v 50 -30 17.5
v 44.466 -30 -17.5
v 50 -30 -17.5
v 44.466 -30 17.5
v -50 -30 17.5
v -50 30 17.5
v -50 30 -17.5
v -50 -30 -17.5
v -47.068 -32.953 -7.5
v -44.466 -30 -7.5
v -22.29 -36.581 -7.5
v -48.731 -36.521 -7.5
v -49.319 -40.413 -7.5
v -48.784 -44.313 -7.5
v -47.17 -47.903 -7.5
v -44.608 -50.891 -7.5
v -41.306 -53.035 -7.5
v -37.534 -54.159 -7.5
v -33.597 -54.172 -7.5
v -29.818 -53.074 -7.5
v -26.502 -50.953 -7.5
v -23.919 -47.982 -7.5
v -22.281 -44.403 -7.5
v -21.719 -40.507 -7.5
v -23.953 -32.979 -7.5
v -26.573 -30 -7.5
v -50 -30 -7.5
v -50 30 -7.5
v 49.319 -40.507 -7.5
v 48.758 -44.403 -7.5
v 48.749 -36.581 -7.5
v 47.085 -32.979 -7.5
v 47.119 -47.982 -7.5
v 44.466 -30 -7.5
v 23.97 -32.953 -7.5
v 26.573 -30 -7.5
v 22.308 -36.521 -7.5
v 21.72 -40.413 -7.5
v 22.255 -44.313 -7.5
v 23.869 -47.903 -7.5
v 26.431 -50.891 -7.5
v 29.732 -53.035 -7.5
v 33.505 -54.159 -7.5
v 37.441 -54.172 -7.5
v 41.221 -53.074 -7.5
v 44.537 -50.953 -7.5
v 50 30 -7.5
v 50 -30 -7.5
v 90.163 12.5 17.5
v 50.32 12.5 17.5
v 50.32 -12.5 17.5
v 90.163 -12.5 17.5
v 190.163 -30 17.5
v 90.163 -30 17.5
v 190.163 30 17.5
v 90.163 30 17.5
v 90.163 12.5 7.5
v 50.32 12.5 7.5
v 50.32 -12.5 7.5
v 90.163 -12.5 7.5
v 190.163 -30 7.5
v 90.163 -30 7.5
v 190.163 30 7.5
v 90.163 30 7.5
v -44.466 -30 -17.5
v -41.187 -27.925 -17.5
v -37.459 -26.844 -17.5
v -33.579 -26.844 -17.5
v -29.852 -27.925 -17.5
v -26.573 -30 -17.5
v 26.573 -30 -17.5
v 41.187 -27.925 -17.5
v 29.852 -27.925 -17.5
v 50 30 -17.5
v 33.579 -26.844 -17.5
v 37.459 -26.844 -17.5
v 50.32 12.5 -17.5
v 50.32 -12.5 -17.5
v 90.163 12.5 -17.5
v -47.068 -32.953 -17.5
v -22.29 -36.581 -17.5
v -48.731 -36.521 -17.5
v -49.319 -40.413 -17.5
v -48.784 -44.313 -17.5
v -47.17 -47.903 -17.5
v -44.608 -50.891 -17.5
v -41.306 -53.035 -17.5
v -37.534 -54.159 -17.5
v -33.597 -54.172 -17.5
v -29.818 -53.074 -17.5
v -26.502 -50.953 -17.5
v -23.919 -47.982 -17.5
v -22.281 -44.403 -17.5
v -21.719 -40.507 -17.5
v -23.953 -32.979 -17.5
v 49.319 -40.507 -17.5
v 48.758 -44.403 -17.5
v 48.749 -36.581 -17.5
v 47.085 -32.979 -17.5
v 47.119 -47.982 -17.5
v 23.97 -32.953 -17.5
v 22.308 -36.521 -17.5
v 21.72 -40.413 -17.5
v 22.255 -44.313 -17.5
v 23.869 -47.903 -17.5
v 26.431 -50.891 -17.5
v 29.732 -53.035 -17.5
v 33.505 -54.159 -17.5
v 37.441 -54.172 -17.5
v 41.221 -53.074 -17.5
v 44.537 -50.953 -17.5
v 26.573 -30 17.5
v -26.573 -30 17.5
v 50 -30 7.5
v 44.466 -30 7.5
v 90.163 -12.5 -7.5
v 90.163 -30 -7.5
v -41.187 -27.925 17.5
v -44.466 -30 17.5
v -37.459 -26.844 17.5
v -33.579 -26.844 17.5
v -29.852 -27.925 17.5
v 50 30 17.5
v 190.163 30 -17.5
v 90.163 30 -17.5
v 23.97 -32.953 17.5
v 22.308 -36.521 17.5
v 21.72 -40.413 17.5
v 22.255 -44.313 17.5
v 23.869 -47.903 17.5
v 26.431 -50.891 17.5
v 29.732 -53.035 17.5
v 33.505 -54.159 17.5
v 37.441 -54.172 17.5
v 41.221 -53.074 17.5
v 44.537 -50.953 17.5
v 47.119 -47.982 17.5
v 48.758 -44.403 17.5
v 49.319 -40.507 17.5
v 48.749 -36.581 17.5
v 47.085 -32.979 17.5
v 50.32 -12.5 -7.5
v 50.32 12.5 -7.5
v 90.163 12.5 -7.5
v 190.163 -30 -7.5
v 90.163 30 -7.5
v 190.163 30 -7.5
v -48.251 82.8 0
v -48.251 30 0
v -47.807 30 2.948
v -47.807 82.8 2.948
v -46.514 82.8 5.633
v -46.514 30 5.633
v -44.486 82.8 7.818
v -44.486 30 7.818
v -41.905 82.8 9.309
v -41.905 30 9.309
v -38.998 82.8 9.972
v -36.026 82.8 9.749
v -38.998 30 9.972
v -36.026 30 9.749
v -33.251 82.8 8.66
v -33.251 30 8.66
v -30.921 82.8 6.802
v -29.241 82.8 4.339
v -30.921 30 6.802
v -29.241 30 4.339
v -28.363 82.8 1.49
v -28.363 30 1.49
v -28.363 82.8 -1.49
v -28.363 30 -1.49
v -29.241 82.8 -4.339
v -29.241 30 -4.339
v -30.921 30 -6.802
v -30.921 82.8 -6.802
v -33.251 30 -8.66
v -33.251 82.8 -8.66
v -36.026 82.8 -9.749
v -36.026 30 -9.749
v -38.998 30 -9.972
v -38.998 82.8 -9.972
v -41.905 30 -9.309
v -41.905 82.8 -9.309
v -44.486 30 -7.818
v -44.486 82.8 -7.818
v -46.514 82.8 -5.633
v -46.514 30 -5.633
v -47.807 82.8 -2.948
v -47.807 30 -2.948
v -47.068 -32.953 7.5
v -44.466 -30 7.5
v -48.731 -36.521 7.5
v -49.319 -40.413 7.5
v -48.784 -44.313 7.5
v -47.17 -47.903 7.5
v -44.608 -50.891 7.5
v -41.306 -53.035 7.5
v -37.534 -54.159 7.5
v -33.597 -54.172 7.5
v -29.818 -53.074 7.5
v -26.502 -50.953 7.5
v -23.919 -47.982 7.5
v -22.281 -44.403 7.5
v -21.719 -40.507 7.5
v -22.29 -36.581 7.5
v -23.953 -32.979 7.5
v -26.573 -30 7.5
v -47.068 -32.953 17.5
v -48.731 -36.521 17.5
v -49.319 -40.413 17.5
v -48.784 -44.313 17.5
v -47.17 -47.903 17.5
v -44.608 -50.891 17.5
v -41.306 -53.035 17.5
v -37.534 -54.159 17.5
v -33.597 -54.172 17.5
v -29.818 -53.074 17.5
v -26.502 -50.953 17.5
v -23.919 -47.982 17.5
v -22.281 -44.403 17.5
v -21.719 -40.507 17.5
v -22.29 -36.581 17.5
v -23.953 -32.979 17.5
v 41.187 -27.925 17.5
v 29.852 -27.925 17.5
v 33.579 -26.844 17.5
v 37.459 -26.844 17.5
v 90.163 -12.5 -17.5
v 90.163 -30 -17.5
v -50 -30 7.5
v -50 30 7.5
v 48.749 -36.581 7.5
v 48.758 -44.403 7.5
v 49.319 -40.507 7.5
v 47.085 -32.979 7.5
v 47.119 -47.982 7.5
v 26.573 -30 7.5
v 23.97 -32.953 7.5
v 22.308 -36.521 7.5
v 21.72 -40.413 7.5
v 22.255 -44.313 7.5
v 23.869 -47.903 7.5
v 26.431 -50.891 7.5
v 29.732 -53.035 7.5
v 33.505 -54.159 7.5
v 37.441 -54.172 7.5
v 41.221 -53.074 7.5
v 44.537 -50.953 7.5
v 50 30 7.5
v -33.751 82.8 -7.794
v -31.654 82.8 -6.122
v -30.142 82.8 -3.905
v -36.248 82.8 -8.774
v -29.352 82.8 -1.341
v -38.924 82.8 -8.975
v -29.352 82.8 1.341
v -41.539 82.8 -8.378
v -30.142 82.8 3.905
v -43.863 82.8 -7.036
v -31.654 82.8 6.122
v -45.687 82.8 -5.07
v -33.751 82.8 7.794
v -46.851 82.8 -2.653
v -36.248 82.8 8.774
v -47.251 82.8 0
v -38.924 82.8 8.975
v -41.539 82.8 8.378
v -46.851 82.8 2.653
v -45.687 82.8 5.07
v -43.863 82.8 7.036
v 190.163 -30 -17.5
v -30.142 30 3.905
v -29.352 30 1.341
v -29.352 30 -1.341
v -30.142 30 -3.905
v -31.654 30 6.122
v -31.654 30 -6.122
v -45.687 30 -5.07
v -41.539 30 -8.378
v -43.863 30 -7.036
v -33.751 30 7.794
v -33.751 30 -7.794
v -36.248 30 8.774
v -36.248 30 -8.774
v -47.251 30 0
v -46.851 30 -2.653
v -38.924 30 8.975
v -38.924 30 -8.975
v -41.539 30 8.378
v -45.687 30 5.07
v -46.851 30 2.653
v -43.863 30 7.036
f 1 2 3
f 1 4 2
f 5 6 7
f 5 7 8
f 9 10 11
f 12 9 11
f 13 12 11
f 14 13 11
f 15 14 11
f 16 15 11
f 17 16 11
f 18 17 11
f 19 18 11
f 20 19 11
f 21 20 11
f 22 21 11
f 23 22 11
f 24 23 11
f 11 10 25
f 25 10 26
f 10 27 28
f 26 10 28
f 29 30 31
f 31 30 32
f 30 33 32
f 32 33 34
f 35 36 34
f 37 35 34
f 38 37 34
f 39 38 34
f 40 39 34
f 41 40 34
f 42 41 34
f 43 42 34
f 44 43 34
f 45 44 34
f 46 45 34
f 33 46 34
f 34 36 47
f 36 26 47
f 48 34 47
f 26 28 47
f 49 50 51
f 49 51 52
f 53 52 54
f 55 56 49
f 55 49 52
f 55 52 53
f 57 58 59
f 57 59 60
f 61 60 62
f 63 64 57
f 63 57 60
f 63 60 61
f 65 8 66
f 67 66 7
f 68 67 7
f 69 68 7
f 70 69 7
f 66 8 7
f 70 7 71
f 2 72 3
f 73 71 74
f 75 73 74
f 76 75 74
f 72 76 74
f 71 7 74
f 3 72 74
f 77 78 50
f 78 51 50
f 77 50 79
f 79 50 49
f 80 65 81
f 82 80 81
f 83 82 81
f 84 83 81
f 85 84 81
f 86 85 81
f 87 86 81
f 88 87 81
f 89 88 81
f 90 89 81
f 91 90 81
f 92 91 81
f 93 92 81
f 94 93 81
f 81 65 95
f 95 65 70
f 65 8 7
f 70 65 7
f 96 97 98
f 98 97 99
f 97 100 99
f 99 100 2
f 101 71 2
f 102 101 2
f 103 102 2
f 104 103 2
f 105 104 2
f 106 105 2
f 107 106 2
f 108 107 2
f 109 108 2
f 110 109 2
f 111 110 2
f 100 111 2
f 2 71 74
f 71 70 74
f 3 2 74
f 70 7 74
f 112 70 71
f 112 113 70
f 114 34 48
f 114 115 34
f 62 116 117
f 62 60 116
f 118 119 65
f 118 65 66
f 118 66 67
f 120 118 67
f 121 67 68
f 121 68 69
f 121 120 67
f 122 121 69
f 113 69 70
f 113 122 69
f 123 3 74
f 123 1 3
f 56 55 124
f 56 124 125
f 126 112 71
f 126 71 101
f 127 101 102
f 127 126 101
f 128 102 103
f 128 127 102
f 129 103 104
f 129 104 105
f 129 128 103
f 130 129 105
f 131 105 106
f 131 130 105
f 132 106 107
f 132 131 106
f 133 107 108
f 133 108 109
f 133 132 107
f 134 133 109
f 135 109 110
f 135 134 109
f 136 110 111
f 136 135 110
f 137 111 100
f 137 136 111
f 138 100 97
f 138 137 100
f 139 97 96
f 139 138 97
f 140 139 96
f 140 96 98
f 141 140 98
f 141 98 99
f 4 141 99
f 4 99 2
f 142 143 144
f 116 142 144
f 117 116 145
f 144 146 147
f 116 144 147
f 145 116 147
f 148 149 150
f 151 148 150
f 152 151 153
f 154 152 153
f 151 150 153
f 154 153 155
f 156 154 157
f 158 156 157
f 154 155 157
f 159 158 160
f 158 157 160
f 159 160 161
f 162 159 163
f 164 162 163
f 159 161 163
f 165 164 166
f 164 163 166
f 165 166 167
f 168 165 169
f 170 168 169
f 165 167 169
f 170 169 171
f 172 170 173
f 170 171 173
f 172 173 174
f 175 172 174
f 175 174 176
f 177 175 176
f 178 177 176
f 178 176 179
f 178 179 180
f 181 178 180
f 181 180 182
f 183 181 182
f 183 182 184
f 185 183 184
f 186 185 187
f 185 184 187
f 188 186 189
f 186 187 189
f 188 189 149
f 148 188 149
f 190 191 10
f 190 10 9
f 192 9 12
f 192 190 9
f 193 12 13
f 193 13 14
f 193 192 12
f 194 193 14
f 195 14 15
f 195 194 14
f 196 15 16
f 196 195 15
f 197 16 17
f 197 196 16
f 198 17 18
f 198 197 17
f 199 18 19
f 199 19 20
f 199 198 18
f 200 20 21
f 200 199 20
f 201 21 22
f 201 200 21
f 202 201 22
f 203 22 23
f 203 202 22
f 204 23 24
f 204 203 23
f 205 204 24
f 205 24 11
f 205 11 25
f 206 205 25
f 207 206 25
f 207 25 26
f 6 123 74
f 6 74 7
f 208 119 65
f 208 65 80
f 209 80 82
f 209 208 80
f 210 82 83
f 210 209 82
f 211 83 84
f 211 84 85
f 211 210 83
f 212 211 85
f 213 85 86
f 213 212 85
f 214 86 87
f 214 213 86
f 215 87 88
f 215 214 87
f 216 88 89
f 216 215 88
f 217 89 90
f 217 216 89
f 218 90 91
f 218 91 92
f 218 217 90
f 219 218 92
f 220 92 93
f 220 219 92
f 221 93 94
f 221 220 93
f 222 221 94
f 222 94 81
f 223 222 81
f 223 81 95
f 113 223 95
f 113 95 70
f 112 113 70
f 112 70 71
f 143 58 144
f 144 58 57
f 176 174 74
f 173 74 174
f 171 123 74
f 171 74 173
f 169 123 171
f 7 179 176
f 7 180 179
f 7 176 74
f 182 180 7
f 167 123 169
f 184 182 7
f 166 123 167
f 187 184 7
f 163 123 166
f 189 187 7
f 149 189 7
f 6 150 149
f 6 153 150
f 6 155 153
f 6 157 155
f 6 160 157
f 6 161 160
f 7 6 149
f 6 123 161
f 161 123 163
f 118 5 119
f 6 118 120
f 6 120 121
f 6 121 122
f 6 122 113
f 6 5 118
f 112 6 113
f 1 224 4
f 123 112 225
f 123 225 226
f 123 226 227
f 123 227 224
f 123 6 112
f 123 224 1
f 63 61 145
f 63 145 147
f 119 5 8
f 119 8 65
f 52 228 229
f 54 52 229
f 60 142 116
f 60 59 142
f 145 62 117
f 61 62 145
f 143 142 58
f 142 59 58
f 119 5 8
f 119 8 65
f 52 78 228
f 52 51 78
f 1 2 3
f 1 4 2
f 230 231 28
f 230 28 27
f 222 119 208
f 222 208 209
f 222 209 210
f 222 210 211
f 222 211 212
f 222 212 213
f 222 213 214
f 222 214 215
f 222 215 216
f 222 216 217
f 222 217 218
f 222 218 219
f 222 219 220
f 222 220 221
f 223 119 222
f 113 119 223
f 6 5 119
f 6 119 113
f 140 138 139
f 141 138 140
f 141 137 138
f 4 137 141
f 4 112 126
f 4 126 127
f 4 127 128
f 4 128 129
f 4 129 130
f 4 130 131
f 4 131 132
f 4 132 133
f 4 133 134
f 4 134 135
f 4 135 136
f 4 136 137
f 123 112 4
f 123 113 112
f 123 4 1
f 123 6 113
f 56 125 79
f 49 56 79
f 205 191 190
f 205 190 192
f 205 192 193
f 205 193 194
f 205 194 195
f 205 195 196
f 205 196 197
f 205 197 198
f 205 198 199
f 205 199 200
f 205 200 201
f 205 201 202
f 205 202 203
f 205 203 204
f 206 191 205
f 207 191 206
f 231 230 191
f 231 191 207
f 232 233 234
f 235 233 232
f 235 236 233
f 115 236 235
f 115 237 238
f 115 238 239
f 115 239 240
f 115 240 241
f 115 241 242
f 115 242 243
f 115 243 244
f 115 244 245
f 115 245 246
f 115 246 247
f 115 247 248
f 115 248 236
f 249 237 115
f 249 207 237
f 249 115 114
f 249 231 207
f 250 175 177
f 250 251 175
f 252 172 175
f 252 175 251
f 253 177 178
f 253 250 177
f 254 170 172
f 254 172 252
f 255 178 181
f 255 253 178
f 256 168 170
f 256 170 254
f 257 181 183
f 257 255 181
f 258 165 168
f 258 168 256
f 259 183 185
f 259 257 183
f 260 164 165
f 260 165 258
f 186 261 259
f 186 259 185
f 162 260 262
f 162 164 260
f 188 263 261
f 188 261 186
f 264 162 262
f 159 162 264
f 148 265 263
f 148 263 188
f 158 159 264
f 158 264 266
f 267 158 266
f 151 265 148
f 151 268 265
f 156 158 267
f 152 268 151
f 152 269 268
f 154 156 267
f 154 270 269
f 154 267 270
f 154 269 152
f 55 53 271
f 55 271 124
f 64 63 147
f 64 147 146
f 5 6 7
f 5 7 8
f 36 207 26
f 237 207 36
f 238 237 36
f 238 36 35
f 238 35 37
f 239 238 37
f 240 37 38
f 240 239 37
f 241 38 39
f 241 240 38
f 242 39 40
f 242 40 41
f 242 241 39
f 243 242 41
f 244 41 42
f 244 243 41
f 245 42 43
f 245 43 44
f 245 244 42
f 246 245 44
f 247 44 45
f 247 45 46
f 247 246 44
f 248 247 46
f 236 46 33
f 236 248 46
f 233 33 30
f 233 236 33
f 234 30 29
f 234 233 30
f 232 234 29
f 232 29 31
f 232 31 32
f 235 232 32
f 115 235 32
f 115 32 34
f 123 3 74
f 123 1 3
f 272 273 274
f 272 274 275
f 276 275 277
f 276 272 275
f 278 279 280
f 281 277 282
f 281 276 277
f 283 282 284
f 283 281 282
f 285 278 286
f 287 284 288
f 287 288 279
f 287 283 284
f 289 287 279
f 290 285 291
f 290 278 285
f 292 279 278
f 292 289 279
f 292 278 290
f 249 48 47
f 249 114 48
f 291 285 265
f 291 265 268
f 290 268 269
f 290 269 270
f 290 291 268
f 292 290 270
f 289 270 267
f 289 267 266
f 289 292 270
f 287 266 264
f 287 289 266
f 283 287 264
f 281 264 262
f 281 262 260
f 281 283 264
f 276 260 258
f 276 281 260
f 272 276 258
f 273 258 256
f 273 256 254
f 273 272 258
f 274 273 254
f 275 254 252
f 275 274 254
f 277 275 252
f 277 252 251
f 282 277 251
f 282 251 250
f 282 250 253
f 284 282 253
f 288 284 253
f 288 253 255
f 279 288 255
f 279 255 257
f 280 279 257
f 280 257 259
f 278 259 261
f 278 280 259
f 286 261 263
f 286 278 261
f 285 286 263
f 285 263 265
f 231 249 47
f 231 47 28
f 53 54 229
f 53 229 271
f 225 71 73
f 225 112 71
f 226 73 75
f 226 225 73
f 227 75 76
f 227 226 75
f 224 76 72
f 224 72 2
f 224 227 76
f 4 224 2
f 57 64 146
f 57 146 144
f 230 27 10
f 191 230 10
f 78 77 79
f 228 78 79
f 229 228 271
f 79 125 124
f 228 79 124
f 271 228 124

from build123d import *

# Parameters (mm, degrees)
F1_DEPTH = 17.5
F2_R     = 10
F2_R_2   = 9
F3_DEPTH = 52.8
F4_DEPTH = 7.5
F0_W     = 10.1569265127
F0_H     = 25
F0_W_2   = 39.8430734873
F5_DEPTH = 17.5


with BuildPart() as f1:
    # F0 (on Top) → F1 (new body, symmetric)
    with BuildSketch(Plane.XY):
        with BuildLine():
            Line((50, -30), (50, 30))
            Line((50, 30), (-50, 30))
            Line((-50, 30), (-50, -30))
            Line((-50, -30), (-44.4656194828, -30))
            ThreePointArc((-44.4656194828, -30), (-35.5191864073, -26.7071517289), (-26.5727533318, -30))
            Line((-26.5727533318, -30), (26.5727533318, -30))
            ThreePointArc((26.5727533318, -30), (35.5191864073, -26.7071517289), (44.4656194828, -30))
            Line((44.4656194828, -30), (50, -30))
        make_face()
    extrude(amount=F1_DEPTH, both=True)

    # F2 (on face) → F3 (join)
    with BuildSketch(Plane(origin=(0, 30, 0), x_dir=(-1, 0, 0), z_dir=(0, 1, 0))):
        with Locations((38.2511450312, 0)):
            Circle(F2_R)
        with Locations((38.2511450312, 0)):
            Circle(F2_R_2, mode=Mode.SUBTRACT)
    extrude(amount=F3_DEPTH)


with BuildPart() as f4:
    # F0 (on Top) → F4 (new body, symmetric)
    with BuildSketch(Plane.XY):
        with BuildLine():
            Line((50, -30), (50, 30))
            Line((50, 30), (-50, 30))
            Line((-50, 30), (-50, -30))
            Line((-50, -30), (-44.4656194828, -30))
            ThreePointArc((-44.4656194828, -30), (-35.5191864073, -26.7071517289), (-26.5727533318, -30))
            Line((-26.5727533318, -30), (26.5727533318, -30))
            ThreePointArc((26.5727533318, -30), (35.5191864073, -26.7071517289), (44.4656194828, -30))
            Line((44.4656194828, -30), (50, -30))
        make_face()
        with BuildLine():
            ThreePointArc((49.319019717, -40.5069850385), (48.0470490449, -34.7200983878), (44.4656194828, -30))
            Line((44.4656194828, -30), (26.5727533318, -30))
            ThreePointArc((26.5727533318, -30), (29.7322997566, -53.0348476761), (49.319019717, -40.5069850385))
        make_face()
        with BuildLine():
            Line((26.5727533318, -30), (44.4656194828, -30))
            ThreePointArc((44.4656194828, -30), (35.5191864073, -26.7071517289), (26.5727533318, -30))
        make_face()
        with BuildLine():
            ThreePointArc((-26.5727533318, -30), (-35.5191864073, -26.7071517289), (-44.4656194828, -30))
            Line((-44.4656194828, -30), (-26.5727533318, -30))
        make_face()
        with BuildLine():
            Line((-26.5727533318, -30), (-44.4656194828, -30))
            ThreePointArc((-44.4656194828, -30), (-41.306073058, -53.0348476761), (-21.7193530977, -40.5069850385))
            ThreePointArc((-21.7193530977, -40.5069850385), (-22.9913237698, -34.7200983878), (-26.5727533318, -30))
        make_face()
    extrude(amount=F4_DEPTH, both=True)


with BuildPart() as f4b:
    # F0 (on Top) → F4, piece 2 (new body, symmetric)
    with BuildSketch(Plane.XY):
        with Locations((95.2413186431, 0)):
            Rectangle(F0_W, F0_H)
        Polygon((90.1628553867, 12.5), (100.3197818995, 12.5), (100.3197818995, -12.5), (90.1628553867, -12.5), (90.1628553867, -30), (190.1628553867, -30), (190.1628553867, 30), (90.1628553867, 30), align=None)
        with Locations((70.2413186431, 0)):
            Rectangle(F0_W_2, F0_H)
    extrude(amount=F4_DEPTH, both=True)


with BuildPart() as f5:
    # F0 (on Top) → F5 (new body, symmetric)
    with BuildSketch(Plane.XY):
        with BuildLine():
            Line((50, -30), (50, 30))
            Line((50, 30), (-50, 30))
            Line((-50, 30), (-50, -30))
            Line((-50, -30), (-44.4656194828, -30))
            ThreePointArc((-44.4656194828, -30), (-35.5191864073, -26.7071517289), (-26.5727533318, -30))
            Line((-26.5727533318, -30), (26.5727533318, -30))
            ThreePointArc((26.5727533318, -30), (35.5191864073, -26.7071517289), (44.4656194828, -30))
            Line((44.4656194828, -30), (50, -30))
        make_face()
        with BuildLine():
            ThreePointArc((49.319019717, -40.5069850385), (48.0470490449, -34.7200983878), (44.4656194828, -30))
            Line((44.4656194828, -30), (26.5727533318, -30))
            ThreePointArc((26.5727533318, -30), (29.7322997566, -53.0348476761), (49.319019717, -40.5069850385))
        make_face()
        with BuildLine():
            Line((26.5727533318, -30), (44.4656194828, -30))
            ThreePointArc((44.4656194828, -30), (35.5191864073, -26.7071517289), (26.5727533318, -30))
        make_face()
        with BuildLine():
            ThreePointArc((-26.5727533318, -30), (-35.5191864073, -26.7071517289), (-44.4656194828, -30))
            Line((-44.4656194828, -30), (-26.5727533318, -30))
        make_face()
        with BuildLine():
            Line((-26.5727533318, -30), (-44.4656194828, -30))
            ThreePointArc((-44.4656194828, -30), (-41.306073058, -53.0348476761), (-21.7193530977, -40.5069850385))
            ThreePointArc((-21.7193530977, -40.5069850385), (-22.9913237698, -34.7200983878), (-26.5727533318, -30))
        make_face()
    extrude(amount=F5_DEPTH, both=True)


with BuildPart() as f5b:
    # F0 (on Top) → F5, piece 2 (new body, symmetric)
    with BuildSketch(Plane.XY):
        with Locations((95.2413186431, 0)):
            Rectangle(F0_W, F0_H)
        Polygon((90.1628553867, 12.5), (100.3197818995, 12.5), (100.3197818995, -12.5), (90.1628553867, -12.5), (90.1628553867, -30), (190.1628553867, -30), (190.1628553867, 30), (90.1628553867, 30), align=None)
        with Locations((70.2413186431, 0)):
            Rectangle(F0_W_2, F0_H)
    extrude(amount=F5_DEPTH, both=True)


solid = Compound([f1.part, f4.part, f4b.part, f5.part, f5b.part])
